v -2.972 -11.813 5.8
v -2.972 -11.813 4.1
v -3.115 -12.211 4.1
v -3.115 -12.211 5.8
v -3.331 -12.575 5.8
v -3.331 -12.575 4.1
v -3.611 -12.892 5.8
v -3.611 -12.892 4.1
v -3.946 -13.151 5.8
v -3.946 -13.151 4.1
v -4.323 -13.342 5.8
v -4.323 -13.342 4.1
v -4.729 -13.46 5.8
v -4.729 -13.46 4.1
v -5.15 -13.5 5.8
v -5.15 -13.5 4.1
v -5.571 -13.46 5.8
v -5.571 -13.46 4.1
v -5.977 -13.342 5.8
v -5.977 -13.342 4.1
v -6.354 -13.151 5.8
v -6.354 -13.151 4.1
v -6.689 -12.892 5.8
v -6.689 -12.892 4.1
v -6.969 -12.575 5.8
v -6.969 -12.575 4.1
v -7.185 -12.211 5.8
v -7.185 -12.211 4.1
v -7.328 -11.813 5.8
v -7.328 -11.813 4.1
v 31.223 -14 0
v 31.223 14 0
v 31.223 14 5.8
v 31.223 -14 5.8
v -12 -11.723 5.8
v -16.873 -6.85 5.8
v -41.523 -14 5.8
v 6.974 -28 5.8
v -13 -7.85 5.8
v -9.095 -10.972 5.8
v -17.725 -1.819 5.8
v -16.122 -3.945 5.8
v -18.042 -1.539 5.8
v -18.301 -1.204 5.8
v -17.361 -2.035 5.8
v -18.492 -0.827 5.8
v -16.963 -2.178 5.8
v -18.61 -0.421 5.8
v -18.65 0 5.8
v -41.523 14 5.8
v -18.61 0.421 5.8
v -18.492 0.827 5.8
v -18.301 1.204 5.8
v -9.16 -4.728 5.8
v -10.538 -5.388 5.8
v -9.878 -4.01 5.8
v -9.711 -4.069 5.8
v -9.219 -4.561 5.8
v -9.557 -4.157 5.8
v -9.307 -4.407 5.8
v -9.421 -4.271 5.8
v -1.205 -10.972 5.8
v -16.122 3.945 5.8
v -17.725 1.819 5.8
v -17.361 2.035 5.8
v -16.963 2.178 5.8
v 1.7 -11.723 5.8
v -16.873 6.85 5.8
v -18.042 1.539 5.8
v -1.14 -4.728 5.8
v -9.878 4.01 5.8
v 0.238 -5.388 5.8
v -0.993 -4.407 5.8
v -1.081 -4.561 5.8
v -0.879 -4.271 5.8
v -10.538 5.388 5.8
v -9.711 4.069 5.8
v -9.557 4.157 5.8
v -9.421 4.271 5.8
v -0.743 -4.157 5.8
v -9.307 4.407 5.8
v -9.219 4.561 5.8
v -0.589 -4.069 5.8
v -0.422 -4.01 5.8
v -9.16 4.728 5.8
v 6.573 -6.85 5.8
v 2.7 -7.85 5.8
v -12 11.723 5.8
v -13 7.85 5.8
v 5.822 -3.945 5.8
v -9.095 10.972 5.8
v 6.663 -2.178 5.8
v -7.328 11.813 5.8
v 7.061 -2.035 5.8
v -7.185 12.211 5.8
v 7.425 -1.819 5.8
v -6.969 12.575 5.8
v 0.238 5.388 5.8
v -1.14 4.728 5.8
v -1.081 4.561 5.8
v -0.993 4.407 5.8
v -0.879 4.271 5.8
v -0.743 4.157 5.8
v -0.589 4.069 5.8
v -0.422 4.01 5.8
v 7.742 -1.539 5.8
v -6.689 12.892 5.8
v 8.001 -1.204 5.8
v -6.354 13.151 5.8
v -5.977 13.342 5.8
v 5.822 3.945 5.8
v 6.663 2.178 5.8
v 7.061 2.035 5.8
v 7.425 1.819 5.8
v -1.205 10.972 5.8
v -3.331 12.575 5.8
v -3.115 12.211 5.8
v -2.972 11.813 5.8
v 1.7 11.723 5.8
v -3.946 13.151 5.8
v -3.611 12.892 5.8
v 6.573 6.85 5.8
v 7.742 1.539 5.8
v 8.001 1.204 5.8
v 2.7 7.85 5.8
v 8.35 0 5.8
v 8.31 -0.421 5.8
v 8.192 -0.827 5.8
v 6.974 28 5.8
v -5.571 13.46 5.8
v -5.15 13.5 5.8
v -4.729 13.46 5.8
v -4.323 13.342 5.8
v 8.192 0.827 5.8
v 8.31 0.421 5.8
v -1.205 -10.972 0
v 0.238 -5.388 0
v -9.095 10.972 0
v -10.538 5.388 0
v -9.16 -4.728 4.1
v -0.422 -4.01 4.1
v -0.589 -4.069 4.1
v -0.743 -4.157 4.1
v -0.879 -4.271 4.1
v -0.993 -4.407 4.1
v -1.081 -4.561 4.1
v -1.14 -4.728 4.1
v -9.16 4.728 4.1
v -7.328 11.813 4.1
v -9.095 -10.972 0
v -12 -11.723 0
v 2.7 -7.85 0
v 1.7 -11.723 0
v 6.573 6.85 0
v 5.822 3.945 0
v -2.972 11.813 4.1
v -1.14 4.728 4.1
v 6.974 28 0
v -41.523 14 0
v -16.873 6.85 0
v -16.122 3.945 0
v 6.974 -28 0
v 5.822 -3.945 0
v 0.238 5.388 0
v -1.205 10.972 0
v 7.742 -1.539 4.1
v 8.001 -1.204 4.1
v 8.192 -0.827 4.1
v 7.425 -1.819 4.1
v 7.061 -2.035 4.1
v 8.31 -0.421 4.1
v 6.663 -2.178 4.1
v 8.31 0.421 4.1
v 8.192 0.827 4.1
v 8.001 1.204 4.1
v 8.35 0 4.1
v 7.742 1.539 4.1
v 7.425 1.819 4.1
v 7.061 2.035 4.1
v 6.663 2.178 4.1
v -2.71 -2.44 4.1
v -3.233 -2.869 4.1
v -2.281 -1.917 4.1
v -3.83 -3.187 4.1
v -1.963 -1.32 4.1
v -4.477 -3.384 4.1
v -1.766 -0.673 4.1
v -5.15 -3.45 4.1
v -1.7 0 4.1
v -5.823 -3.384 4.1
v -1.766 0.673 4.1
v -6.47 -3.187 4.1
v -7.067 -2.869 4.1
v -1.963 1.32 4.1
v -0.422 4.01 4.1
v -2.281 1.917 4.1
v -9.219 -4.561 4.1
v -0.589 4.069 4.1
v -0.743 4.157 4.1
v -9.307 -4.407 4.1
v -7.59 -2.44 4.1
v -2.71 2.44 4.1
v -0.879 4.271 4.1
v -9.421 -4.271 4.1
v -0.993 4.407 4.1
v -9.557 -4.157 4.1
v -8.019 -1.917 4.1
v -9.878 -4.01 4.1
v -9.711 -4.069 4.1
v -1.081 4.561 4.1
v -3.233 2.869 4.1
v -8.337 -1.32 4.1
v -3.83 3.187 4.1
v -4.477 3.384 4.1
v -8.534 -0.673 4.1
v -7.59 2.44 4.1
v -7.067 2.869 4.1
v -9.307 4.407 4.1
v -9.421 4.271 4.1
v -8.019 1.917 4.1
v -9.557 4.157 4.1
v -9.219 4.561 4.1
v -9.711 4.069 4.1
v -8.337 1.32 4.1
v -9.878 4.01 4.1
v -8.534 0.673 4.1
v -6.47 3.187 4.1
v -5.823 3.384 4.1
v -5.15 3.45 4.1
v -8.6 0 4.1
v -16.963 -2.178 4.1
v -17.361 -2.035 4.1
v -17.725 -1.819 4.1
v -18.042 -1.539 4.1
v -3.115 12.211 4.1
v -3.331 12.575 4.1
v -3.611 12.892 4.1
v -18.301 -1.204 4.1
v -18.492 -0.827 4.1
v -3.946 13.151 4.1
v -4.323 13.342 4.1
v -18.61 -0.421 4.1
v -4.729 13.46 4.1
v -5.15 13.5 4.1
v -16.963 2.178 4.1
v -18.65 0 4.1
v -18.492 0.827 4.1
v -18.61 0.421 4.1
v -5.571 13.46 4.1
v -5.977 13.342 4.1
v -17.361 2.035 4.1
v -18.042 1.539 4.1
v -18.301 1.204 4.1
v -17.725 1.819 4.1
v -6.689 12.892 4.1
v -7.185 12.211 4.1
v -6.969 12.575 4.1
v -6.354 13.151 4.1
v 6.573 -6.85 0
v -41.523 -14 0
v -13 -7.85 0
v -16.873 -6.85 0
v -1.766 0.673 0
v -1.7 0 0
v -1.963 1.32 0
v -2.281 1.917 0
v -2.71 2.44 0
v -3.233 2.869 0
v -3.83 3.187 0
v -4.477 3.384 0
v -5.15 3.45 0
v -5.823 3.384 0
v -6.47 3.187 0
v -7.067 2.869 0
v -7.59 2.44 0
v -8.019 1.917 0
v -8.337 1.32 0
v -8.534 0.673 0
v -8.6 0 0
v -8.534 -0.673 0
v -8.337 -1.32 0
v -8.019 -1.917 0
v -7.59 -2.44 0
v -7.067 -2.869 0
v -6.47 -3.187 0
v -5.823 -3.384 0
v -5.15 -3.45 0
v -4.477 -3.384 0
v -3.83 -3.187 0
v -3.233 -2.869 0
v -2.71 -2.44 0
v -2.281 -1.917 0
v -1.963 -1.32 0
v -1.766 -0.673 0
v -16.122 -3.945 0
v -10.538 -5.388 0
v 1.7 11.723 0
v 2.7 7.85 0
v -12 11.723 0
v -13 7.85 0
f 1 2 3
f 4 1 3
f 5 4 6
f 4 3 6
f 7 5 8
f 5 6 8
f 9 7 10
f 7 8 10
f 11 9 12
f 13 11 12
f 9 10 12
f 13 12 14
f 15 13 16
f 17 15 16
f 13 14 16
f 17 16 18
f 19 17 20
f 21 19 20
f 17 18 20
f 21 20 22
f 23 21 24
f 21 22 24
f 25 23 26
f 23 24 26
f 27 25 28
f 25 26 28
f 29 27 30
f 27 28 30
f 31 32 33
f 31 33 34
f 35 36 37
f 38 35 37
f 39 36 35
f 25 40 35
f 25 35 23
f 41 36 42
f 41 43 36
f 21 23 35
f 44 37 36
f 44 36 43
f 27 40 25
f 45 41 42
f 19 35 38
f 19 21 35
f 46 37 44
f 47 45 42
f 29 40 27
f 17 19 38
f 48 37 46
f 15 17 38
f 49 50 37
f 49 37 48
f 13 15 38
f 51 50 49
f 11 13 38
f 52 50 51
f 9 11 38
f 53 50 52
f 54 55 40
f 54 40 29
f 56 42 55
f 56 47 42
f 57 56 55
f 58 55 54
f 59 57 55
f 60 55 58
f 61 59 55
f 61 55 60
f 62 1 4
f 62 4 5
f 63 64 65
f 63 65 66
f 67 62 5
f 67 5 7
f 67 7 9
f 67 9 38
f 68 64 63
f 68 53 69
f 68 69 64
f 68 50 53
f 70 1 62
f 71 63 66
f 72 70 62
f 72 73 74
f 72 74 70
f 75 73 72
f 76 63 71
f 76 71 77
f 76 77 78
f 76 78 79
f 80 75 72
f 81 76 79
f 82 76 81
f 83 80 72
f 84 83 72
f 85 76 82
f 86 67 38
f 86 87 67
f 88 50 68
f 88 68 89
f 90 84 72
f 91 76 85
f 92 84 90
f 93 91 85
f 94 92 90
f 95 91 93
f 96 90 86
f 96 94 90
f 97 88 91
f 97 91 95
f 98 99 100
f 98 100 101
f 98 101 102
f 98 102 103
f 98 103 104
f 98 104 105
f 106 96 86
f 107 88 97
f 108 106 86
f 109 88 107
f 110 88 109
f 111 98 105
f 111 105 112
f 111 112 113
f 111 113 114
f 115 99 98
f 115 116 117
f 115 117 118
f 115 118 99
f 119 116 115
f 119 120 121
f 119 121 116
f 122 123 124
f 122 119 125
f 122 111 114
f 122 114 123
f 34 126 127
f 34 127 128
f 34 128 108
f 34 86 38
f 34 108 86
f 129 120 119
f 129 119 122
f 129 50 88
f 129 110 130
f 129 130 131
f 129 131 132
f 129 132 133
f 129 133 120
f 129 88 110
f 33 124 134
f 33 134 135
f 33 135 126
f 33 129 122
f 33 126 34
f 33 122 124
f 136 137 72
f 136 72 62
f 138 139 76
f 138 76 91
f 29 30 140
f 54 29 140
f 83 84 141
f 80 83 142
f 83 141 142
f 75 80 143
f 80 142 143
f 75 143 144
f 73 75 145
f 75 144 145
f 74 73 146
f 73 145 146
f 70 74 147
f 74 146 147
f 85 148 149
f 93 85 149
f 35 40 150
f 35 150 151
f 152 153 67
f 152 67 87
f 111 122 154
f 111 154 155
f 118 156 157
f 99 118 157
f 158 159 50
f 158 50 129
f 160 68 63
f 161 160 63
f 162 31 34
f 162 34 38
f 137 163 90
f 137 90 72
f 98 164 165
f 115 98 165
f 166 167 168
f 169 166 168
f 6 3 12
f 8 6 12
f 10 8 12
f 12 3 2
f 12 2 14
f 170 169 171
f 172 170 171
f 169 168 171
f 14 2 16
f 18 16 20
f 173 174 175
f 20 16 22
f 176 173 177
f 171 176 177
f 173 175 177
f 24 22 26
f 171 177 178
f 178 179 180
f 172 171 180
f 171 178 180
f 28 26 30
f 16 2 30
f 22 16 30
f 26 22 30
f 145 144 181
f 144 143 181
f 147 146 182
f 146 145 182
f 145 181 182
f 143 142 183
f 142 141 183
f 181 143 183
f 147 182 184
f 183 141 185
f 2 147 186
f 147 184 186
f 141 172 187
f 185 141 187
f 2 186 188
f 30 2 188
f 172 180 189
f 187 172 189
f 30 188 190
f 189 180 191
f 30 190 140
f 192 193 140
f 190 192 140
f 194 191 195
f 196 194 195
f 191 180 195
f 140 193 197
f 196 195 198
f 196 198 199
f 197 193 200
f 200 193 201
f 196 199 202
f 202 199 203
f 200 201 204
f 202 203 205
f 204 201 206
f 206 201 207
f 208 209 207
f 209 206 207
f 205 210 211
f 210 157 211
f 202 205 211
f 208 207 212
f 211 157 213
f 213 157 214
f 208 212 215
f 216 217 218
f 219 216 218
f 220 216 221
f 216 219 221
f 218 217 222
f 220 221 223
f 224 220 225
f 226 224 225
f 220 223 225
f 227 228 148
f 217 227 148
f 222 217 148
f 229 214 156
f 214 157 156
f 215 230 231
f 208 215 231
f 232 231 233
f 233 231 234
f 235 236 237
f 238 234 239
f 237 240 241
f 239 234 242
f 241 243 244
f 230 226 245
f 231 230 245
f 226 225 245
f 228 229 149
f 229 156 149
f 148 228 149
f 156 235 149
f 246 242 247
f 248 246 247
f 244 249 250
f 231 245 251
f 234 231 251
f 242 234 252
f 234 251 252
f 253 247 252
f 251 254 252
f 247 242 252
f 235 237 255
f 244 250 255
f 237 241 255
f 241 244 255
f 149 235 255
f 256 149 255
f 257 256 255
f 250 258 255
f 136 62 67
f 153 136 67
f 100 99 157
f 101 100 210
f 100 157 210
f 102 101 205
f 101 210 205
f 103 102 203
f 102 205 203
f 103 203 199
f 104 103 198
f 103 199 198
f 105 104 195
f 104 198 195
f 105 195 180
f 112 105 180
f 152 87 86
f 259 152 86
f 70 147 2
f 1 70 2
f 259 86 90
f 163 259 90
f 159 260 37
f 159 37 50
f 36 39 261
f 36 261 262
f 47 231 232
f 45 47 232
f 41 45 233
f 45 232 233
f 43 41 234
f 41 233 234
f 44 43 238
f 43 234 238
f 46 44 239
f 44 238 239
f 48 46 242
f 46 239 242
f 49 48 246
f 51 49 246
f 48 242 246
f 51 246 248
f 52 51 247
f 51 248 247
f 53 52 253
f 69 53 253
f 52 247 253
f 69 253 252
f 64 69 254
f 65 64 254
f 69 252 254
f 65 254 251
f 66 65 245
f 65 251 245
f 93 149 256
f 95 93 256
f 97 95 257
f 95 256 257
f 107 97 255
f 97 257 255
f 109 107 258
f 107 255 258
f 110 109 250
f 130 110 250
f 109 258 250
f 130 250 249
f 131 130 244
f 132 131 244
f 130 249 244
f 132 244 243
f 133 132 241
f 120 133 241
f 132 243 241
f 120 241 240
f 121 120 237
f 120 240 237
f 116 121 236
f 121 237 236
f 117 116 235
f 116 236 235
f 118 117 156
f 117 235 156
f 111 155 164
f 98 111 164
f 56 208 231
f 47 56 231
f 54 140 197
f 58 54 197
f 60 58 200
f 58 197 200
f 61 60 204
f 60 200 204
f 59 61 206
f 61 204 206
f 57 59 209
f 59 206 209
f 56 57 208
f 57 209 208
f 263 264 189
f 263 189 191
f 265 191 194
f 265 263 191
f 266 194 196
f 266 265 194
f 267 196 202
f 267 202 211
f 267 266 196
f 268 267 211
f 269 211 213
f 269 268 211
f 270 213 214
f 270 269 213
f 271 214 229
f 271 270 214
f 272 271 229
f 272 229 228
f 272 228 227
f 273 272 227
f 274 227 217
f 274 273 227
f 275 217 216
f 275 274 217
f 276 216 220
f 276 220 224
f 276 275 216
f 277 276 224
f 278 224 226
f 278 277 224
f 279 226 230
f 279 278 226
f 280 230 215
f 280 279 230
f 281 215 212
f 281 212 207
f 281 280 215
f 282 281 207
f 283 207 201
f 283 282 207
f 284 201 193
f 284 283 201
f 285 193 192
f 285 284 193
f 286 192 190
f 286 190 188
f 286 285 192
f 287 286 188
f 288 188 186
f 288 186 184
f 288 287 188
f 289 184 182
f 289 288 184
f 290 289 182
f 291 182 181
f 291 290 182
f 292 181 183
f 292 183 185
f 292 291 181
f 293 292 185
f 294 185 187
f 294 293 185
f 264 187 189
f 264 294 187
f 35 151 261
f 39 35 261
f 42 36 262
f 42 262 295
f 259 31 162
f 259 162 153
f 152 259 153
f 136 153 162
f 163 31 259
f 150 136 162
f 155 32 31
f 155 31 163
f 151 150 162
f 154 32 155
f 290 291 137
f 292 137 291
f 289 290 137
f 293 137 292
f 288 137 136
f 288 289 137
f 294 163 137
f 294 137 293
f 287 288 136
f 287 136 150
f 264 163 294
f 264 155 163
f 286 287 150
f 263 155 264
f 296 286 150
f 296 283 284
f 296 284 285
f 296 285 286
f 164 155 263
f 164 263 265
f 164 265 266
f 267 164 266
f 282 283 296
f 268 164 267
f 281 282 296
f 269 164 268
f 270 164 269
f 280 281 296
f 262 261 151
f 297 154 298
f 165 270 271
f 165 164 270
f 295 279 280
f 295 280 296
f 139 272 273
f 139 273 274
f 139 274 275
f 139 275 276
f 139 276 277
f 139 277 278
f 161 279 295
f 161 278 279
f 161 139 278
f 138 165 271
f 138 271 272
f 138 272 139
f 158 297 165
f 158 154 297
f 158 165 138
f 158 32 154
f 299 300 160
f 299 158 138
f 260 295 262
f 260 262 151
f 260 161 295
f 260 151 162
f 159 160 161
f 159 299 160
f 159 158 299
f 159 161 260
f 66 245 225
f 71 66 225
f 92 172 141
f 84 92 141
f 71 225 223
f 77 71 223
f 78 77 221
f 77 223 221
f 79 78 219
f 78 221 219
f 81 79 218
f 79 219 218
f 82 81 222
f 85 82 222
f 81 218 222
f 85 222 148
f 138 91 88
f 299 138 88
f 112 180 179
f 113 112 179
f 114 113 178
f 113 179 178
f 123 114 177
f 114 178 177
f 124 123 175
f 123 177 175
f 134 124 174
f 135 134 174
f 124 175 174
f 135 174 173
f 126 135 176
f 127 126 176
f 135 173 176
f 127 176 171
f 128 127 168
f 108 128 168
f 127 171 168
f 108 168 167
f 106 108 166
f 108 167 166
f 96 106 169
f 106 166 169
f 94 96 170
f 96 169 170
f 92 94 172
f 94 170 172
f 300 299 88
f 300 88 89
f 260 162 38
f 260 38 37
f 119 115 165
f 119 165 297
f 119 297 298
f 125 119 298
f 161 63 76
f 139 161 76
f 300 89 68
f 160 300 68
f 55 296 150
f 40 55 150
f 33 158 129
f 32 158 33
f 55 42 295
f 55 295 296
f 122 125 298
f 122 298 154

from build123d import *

# Parameters (mm, degrees)
SKETCH1_R            = 3.45
BOSS_EXTRUDE1_DEPTH  = 4.1
BOSS_EXTRUDE2_DEPTH  = 5.8
CUT_EXTRUDE1_DEPTH   = 51.416317693
MIRROR2_COPY_1_DEPTH = 51.416317693


with BuildPart() as part:
    # Sketch1 → Boss-Extrude1 (new body)
    with BuildSketch(Plane.XY):
        Polygon((6.974355653, -28), (-41.523066959, -14), (-41.523066959, 14), (6.974355653, 28), (31.223066959, 14), (31.223066959, -14), align=None)
        with Locations((-5.15, 0)):
            Circle(SKETCH1_R, mode=Mode.SUBTRACT)
    extrude(amount=BOSS_EXTRUDE1_DEPTH)

    # Sketch1<3> → Boss-Extrude2 (add)
    with BuildSketch(Plane.XY):
        Polygon((-41.523066959, -14), (6.974355653, -28), (31.223066959, -14), (31.223066959, 14), (6.974355653, 28), (-41.523066959, 14), align=None)
        with BuildLine():
            Line((-1.14034217, -4.727614303), (-2.971580528, -11.813017409))
            ThreePointArc((-2.971580528, -11.813017409), (-5.15, -13.5), (-7.328419472, -11.813017409))
            Line((-7.328419472, -11.813017409), (-9.15965783, -4.727614303))
            ThreePointArc((-9.15965783, -4.727614303), (-9.420737481, -4.270737481), (-9.877614303, -4.00965783))
            Line((-9.877614303, -4.00965783), (-16.963017409, -2.178419472))
            ThreePointArc((-16.963017409, -2.178419472), (-18.65, 0), (-16.963017409, 2.178419472))
            Line((-16.963017409, 2.178419472), (-9.877614303, 4.00965783))
            ThreePointArc((-9.877614303, 4.00965783), (-9.420737481, 4.270737481), (-9.15965783, 4.727614303))
            Line((-9.15965783, 4.727614303), (-7.328419472, 11.813017409))
            ThreePointArc((-7.328419472, 11.813017409), (-5.15, 13.5), (-2.971580528, 11.813017409))
            Line((-2.971580528, 11.813017409), (-1.14034217, 4.727614303))
            ThreePointArc((-1.14034217, 4.727614303), (-0.879262519, 4.270737481), (-0.422385697, 4.00965783))
            Line((-0.422385697, 4.00965783), (6.663017409, 2.178419472))
            ThreePointArc((6.663017409, 2.178419472), (8.35, 0), (6.663017409, -2.178419472))
            Line((6.663017409, -2.178419472), (-0.422385697, -4.00965783))
            ThreePointArc((-0.422385697, -4.00965783), (-0.879262519, -4.270737481), (-1.14034217, -4.727614303))
        make_face(mode=Mode.SUBTRACT)
    extrude(amount=BOSS_EXTRUDE2_DEPTH)

    # Sketch3 → Cut-Extrude1 (cut, through all)
    with BuildSketch(Plane.XY.offset(5.8)):
        Polygon((-13.000425446, 7.850425446), (-16.873171174, 6.849505608), (-16.122481296, 3.944946311), (-10.538213003, 5.388213003), (-9.094946311, 10.972481296), (-11.999505608, 11.723171174), align=None)
    cut_extrude1 = extrude(amount=-CUT_EXTRUDE1_DEPTH, mode=Mode.SUBTRACT)

    # Mirror1: Cut-Extrude1 across plane
    add(cut_extrude1.mirror(Plane.ZY.offset(5.15)), mode=Mode.SUBTRACT)

    # Mirror2: Cut-Extrude1 across plane
    add(cut_extrude1.mirror(Plane(origin=(0, 0, 0), x_dir=(0, 0, 1), z_dir=(0, -1, 0))), mode=Mode.SUBTRACT)

    # Mirror2 copy 1 sketch → Mirror2 copy 1 (cut, through all)
    with BuildSketch(Plane(origin=(-10.3, 0, 5.8), x_dir=(-1, 0, 0), z_dir=(0, 0, 1))):
        Polygon((-13.000425446, 7.850425446), (-16.873171174, 6.849505608), (-16.122481296, 3.944946311), (-10.538213003, 5.388213003), (-9.094946311, 10.972481296), (-11.999505608, 11.723171174), align=None)
    extrude(amount=-MIRROR2_COPY_1_DEPTH, mode=Mode.SUBTRACT)


solid = part.part
